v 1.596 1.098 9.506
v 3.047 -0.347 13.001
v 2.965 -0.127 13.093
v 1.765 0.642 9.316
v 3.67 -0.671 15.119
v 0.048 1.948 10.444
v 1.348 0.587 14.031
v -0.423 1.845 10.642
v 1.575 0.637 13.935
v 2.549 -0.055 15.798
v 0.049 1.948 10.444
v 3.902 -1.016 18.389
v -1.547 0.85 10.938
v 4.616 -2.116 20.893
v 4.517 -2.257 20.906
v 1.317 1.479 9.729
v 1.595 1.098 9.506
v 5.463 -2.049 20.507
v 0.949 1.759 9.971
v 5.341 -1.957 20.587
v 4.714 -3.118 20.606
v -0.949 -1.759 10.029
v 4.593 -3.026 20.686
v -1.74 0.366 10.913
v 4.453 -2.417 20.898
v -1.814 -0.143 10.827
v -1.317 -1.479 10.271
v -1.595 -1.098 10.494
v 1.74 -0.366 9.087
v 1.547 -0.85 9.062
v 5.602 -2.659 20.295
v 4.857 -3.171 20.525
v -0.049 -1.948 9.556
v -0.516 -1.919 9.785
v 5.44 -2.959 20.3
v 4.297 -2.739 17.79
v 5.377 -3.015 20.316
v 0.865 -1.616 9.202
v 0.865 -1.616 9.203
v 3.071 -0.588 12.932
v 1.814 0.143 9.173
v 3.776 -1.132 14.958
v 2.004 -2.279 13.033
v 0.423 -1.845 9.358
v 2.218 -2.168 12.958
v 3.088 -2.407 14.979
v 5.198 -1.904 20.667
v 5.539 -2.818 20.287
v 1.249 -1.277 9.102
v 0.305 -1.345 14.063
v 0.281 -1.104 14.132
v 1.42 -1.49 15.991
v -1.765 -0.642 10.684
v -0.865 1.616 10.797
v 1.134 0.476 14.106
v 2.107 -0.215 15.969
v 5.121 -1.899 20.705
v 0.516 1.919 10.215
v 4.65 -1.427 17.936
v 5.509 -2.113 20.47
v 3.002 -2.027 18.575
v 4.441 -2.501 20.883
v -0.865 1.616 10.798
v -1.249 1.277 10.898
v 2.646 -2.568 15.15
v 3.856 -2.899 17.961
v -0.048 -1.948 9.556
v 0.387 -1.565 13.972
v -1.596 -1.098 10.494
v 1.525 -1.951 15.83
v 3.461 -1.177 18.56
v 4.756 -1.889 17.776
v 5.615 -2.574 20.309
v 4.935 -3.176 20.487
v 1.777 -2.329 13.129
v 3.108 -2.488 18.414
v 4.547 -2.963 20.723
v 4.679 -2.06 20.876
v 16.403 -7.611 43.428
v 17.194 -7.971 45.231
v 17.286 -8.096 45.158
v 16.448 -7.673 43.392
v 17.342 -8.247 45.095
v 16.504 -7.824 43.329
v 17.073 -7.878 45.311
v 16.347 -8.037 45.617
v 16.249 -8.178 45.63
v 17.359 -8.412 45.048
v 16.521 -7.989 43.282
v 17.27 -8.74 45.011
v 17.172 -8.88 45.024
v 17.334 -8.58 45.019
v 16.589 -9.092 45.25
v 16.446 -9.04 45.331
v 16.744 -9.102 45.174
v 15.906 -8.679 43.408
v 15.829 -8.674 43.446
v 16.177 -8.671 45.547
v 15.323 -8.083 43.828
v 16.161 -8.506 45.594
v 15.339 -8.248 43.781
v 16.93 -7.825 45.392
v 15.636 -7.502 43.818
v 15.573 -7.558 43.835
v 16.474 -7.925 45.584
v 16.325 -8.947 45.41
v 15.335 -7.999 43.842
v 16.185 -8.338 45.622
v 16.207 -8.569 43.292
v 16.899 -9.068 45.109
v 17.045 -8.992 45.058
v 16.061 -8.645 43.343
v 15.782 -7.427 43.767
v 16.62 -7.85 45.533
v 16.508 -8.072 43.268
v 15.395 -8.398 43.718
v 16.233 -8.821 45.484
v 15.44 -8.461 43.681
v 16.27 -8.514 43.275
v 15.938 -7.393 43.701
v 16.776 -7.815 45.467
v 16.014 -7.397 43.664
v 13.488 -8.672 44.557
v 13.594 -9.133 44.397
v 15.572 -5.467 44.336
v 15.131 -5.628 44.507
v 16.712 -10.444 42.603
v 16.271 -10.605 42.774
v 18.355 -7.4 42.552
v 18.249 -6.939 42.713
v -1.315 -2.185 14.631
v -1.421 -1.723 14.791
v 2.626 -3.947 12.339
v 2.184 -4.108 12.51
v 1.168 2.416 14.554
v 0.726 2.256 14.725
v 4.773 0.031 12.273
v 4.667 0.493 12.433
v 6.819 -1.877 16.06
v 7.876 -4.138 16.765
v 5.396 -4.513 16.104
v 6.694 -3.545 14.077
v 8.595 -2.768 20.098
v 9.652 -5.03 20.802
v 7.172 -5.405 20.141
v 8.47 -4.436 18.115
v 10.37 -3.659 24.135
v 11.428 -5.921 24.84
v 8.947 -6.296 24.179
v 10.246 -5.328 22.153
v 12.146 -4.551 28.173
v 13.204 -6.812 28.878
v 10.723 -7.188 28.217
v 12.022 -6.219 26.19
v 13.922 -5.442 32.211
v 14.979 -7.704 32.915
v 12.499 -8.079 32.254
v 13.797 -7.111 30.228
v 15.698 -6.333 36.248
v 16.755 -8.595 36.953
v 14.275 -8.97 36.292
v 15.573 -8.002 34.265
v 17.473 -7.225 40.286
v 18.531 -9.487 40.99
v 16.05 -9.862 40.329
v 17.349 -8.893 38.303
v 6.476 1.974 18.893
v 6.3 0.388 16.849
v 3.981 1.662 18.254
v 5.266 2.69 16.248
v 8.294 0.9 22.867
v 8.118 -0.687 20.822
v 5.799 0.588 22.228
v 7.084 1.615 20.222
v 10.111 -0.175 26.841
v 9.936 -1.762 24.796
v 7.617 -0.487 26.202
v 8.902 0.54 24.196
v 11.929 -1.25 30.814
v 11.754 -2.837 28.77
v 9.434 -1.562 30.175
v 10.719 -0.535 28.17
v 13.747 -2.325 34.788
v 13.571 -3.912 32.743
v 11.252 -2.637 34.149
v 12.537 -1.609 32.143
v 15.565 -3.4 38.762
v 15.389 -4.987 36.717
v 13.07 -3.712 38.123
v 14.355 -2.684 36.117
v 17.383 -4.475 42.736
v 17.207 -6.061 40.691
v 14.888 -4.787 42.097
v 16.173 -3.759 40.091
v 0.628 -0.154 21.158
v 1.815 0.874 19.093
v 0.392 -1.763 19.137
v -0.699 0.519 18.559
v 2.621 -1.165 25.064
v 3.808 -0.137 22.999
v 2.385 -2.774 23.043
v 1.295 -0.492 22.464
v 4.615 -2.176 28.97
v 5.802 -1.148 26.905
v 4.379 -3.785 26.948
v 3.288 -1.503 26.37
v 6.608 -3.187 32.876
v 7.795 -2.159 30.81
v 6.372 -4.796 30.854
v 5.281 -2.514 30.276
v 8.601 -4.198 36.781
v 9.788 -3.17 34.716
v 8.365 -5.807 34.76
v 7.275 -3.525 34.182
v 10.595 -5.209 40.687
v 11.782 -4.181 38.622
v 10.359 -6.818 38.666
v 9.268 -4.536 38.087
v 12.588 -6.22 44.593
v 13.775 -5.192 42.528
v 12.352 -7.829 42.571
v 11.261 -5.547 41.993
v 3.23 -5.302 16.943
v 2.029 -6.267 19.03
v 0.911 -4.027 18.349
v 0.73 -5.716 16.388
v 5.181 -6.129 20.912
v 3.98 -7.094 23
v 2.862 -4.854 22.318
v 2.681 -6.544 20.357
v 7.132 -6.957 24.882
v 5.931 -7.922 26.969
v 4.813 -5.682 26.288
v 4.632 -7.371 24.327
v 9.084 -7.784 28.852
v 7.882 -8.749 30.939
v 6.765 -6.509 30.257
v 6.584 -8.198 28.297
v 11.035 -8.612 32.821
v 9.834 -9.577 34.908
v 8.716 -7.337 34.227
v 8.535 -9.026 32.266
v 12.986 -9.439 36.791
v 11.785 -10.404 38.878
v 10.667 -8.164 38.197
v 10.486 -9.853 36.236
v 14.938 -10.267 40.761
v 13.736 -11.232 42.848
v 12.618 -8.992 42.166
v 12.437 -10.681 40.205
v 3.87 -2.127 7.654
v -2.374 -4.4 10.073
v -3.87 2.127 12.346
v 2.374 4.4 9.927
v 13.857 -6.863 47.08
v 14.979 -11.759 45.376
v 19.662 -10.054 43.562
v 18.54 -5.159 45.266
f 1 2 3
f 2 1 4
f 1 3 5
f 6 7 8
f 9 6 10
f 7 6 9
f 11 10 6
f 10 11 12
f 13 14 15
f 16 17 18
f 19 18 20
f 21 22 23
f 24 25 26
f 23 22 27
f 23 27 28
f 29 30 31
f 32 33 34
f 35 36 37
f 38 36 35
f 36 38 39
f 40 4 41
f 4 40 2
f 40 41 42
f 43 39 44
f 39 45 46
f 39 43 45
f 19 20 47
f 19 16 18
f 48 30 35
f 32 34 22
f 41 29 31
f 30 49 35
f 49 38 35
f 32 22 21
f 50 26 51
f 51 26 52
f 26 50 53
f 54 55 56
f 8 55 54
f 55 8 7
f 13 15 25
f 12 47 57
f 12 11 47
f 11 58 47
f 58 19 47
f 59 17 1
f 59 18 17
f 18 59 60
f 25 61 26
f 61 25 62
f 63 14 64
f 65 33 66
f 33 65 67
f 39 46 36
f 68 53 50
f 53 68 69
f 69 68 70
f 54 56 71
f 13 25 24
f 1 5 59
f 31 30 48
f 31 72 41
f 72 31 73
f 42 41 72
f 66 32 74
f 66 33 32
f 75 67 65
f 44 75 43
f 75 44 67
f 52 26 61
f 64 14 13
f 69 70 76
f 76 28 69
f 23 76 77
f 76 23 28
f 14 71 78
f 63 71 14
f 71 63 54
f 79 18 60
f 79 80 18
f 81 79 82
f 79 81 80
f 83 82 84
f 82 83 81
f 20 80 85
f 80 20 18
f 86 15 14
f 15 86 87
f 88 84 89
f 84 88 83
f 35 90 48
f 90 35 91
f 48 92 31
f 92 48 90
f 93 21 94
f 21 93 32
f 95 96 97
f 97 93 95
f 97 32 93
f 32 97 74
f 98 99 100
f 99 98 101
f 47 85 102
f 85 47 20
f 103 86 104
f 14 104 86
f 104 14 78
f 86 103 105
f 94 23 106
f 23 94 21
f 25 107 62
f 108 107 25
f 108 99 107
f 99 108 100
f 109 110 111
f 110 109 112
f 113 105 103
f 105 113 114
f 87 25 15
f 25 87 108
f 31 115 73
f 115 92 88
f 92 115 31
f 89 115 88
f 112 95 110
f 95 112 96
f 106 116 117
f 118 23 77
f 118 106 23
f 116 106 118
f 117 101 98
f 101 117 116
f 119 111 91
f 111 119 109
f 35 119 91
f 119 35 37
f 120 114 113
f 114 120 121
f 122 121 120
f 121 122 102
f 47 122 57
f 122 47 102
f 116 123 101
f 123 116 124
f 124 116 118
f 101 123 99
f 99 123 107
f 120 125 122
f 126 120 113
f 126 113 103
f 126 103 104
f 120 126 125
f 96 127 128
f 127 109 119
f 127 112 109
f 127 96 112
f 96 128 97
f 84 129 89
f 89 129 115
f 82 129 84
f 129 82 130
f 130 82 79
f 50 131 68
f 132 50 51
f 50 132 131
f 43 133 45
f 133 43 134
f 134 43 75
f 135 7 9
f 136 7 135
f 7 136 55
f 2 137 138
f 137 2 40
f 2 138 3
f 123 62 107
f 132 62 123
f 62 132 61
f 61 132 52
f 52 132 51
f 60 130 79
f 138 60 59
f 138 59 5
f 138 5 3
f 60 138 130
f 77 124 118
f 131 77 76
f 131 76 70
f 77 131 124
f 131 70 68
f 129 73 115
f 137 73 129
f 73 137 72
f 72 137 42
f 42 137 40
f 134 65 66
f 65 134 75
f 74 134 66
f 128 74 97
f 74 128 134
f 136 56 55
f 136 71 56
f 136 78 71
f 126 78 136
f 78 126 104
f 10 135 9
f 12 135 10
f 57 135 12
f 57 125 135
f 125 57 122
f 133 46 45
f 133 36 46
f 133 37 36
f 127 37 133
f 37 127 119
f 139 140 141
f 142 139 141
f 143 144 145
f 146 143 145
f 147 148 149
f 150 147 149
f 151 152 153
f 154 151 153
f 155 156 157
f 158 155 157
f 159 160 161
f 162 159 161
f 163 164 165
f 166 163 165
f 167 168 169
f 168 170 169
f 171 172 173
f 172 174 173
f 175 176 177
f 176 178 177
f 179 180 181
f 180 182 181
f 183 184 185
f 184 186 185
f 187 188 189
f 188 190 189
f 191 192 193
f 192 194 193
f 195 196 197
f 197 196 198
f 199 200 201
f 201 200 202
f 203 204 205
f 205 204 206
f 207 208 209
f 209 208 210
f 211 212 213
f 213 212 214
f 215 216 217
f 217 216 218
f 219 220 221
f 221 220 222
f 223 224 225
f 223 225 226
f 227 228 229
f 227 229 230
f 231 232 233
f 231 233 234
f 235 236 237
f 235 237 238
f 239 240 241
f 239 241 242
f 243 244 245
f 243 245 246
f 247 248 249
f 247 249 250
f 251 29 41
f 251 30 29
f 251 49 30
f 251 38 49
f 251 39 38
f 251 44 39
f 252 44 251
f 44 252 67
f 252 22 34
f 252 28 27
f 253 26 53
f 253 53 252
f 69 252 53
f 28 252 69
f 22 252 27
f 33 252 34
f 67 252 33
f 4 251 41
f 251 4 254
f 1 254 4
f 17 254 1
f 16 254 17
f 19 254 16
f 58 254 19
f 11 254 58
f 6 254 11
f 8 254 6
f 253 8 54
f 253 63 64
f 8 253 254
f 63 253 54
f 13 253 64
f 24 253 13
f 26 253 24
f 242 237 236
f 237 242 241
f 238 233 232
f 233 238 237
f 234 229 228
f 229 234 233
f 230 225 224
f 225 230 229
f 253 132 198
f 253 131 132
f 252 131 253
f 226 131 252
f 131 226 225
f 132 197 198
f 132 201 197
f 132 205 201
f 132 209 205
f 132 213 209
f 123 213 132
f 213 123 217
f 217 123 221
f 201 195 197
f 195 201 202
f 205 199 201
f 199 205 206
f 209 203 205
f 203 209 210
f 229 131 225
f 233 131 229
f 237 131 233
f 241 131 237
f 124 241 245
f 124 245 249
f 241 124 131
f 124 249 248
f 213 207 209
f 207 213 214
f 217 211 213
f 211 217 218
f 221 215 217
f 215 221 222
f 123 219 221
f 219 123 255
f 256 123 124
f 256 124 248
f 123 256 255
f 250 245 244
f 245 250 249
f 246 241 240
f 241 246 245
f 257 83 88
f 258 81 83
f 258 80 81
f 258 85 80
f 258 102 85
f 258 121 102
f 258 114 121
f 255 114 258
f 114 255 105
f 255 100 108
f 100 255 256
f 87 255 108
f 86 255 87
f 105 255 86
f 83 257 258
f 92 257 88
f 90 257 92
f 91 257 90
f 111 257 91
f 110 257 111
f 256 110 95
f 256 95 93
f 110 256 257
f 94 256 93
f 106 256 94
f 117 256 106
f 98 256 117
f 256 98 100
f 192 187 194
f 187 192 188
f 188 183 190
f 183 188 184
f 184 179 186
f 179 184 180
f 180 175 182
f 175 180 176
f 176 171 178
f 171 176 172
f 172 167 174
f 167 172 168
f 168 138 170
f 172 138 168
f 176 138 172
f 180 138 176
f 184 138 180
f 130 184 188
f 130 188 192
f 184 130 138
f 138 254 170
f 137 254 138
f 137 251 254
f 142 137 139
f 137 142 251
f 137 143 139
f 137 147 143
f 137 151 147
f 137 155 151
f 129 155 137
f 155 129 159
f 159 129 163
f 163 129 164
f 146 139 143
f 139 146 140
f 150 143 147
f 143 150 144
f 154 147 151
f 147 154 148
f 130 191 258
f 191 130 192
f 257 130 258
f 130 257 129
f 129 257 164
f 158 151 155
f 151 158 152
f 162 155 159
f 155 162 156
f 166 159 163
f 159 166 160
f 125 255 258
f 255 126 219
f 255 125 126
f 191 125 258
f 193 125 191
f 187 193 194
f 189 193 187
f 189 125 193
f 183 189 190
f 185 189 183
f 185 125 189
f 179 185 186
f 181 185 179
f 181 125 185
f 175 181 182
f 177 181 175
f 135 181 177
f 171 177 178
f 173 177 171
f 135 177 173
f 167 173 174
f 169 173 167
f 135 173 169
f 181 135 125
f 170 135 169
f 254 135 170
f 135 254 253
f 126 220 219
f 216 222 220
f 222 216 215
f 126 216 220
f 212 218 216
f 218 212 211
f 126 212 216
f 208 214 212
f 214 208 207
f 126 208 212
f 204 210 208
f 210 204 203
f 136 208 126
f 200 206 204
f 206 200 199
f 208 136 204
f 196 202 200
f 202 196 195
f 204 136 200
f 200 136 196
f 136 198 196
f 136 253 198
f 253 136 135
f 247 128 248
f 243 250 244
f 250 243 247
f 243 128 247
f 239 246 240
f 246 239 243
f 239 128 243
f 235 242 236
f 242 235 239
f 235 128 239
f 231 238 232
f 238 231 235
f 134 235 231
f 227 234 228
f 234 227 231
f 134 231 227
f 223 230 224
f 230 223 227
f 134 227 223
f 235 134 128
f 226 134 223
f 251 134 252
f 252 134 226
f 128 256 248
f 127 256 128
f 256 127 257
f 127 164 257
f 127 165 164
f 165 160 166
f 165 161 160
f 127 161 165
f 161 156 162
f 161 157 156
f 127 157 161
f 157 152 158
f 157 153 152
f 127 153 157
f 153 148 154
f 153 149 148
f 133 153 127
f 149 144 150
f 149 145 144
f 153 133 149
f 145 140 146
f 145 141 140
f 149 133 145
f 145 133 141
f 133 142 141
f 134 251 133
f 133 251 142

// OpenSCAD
module wall_anchor (
    drill_hole_dm,          // drill hole diameter
    screw_dm,               // screw diameter
    length,                 // anchor length
    oversize        = 2,    // outer diameter oversize
    outer_taper     = 0.75, // outer taper factor
    inner_taper     = 0.2,  // inner taper factor
    inner_taper_end = 0.3,  // relative end of inner taper along length
    collar          = 0.1,  // relative length of initial non-slit part
    slit            = 0.5,  // slit width
    cap_size        = 2,    // length of the end cap
    teeth_div       = 5,    // divisor determining the number of teeth
    teeth_depth     = 1.5,  // depth of the teeth
    round_shape     = false // make the anchor round instead of square
){

	difference() {

        outer_dm = drill_hole_dm + oversize;
	    side_length   = 
            round_shape ? outer_dm : sqrt( pow(outer_dm, 2) / 2 );

	    linear_extrude( height = length, scale = outer_taper )
	    if ( round_shape )
	    	circle( d = side_length, $fn=36 );
	    else
	    	square( side_length, center = true );

	    // hole
	    abs_taper_end = length * inner_taper_end;
	    taper_dm      = screw_dm * inner_taper;

	    translate( [0, 0, -0.01] )
	    union() {
	        $fn = 24;
            
	        cylinder( d1 = screw_dm, d2 = taper_dm, h = abs_taper_end + 0.01);
	        
	        translate( [0, 0, abs_taper_end] )
	        cylinder( d = taper_dm, h = length - abs_taper_end + 0.02 );
	    }


        // slits
        abs_collar = length * collar;
        
        for (i = [0:1])
        rotate( [0, 0, i * 90] )
        translate([
        	-(side_length + 2) / 2, 
        	-slit / 2, 
        	abs_collar
        ]) 
        cube ([
        	side_length + 2, 
        	slit, 
        	length - cap_size - abs_collar
        ]);
        
        // teeth
        teeth_count = floor( (length - abs_collar) / teeth_div );
        teeth_dist  = (length - abs_collar) / (teeth_count + 1);
        
        opposite = (outer_dm - (outer_dm * outer_taper)) / 2;
        hypotenuse  = sqrt( pow(opposite, 2) + pow(length, 2) );
        angle = asin( opposite / hypotenuse );
        
        diag_dist = sqrt( pow(outer_dm/2 - teeth_depth, 2) / 2 );
                
        for ( j = [0:90:359] )
        rotate( [0, 0, j] )
        rotate( -angle, [1,1,0] )
        for (i = [1:teeth_count] )
        translate( [diag_dist, -diag_dist, abs_collar + i * teeth_dist] )
        rotate([0,0,-45])
        translate( [0, -outer_dm / 2, 0] )
        rotate([0,45,0])
        cube( outer_dm );        
	    
	}

}
translate([0,0,10])
rotate([20,20,20])
wall_anchor(8,4,40, inner_taper = 0.33, round_shape = false);
